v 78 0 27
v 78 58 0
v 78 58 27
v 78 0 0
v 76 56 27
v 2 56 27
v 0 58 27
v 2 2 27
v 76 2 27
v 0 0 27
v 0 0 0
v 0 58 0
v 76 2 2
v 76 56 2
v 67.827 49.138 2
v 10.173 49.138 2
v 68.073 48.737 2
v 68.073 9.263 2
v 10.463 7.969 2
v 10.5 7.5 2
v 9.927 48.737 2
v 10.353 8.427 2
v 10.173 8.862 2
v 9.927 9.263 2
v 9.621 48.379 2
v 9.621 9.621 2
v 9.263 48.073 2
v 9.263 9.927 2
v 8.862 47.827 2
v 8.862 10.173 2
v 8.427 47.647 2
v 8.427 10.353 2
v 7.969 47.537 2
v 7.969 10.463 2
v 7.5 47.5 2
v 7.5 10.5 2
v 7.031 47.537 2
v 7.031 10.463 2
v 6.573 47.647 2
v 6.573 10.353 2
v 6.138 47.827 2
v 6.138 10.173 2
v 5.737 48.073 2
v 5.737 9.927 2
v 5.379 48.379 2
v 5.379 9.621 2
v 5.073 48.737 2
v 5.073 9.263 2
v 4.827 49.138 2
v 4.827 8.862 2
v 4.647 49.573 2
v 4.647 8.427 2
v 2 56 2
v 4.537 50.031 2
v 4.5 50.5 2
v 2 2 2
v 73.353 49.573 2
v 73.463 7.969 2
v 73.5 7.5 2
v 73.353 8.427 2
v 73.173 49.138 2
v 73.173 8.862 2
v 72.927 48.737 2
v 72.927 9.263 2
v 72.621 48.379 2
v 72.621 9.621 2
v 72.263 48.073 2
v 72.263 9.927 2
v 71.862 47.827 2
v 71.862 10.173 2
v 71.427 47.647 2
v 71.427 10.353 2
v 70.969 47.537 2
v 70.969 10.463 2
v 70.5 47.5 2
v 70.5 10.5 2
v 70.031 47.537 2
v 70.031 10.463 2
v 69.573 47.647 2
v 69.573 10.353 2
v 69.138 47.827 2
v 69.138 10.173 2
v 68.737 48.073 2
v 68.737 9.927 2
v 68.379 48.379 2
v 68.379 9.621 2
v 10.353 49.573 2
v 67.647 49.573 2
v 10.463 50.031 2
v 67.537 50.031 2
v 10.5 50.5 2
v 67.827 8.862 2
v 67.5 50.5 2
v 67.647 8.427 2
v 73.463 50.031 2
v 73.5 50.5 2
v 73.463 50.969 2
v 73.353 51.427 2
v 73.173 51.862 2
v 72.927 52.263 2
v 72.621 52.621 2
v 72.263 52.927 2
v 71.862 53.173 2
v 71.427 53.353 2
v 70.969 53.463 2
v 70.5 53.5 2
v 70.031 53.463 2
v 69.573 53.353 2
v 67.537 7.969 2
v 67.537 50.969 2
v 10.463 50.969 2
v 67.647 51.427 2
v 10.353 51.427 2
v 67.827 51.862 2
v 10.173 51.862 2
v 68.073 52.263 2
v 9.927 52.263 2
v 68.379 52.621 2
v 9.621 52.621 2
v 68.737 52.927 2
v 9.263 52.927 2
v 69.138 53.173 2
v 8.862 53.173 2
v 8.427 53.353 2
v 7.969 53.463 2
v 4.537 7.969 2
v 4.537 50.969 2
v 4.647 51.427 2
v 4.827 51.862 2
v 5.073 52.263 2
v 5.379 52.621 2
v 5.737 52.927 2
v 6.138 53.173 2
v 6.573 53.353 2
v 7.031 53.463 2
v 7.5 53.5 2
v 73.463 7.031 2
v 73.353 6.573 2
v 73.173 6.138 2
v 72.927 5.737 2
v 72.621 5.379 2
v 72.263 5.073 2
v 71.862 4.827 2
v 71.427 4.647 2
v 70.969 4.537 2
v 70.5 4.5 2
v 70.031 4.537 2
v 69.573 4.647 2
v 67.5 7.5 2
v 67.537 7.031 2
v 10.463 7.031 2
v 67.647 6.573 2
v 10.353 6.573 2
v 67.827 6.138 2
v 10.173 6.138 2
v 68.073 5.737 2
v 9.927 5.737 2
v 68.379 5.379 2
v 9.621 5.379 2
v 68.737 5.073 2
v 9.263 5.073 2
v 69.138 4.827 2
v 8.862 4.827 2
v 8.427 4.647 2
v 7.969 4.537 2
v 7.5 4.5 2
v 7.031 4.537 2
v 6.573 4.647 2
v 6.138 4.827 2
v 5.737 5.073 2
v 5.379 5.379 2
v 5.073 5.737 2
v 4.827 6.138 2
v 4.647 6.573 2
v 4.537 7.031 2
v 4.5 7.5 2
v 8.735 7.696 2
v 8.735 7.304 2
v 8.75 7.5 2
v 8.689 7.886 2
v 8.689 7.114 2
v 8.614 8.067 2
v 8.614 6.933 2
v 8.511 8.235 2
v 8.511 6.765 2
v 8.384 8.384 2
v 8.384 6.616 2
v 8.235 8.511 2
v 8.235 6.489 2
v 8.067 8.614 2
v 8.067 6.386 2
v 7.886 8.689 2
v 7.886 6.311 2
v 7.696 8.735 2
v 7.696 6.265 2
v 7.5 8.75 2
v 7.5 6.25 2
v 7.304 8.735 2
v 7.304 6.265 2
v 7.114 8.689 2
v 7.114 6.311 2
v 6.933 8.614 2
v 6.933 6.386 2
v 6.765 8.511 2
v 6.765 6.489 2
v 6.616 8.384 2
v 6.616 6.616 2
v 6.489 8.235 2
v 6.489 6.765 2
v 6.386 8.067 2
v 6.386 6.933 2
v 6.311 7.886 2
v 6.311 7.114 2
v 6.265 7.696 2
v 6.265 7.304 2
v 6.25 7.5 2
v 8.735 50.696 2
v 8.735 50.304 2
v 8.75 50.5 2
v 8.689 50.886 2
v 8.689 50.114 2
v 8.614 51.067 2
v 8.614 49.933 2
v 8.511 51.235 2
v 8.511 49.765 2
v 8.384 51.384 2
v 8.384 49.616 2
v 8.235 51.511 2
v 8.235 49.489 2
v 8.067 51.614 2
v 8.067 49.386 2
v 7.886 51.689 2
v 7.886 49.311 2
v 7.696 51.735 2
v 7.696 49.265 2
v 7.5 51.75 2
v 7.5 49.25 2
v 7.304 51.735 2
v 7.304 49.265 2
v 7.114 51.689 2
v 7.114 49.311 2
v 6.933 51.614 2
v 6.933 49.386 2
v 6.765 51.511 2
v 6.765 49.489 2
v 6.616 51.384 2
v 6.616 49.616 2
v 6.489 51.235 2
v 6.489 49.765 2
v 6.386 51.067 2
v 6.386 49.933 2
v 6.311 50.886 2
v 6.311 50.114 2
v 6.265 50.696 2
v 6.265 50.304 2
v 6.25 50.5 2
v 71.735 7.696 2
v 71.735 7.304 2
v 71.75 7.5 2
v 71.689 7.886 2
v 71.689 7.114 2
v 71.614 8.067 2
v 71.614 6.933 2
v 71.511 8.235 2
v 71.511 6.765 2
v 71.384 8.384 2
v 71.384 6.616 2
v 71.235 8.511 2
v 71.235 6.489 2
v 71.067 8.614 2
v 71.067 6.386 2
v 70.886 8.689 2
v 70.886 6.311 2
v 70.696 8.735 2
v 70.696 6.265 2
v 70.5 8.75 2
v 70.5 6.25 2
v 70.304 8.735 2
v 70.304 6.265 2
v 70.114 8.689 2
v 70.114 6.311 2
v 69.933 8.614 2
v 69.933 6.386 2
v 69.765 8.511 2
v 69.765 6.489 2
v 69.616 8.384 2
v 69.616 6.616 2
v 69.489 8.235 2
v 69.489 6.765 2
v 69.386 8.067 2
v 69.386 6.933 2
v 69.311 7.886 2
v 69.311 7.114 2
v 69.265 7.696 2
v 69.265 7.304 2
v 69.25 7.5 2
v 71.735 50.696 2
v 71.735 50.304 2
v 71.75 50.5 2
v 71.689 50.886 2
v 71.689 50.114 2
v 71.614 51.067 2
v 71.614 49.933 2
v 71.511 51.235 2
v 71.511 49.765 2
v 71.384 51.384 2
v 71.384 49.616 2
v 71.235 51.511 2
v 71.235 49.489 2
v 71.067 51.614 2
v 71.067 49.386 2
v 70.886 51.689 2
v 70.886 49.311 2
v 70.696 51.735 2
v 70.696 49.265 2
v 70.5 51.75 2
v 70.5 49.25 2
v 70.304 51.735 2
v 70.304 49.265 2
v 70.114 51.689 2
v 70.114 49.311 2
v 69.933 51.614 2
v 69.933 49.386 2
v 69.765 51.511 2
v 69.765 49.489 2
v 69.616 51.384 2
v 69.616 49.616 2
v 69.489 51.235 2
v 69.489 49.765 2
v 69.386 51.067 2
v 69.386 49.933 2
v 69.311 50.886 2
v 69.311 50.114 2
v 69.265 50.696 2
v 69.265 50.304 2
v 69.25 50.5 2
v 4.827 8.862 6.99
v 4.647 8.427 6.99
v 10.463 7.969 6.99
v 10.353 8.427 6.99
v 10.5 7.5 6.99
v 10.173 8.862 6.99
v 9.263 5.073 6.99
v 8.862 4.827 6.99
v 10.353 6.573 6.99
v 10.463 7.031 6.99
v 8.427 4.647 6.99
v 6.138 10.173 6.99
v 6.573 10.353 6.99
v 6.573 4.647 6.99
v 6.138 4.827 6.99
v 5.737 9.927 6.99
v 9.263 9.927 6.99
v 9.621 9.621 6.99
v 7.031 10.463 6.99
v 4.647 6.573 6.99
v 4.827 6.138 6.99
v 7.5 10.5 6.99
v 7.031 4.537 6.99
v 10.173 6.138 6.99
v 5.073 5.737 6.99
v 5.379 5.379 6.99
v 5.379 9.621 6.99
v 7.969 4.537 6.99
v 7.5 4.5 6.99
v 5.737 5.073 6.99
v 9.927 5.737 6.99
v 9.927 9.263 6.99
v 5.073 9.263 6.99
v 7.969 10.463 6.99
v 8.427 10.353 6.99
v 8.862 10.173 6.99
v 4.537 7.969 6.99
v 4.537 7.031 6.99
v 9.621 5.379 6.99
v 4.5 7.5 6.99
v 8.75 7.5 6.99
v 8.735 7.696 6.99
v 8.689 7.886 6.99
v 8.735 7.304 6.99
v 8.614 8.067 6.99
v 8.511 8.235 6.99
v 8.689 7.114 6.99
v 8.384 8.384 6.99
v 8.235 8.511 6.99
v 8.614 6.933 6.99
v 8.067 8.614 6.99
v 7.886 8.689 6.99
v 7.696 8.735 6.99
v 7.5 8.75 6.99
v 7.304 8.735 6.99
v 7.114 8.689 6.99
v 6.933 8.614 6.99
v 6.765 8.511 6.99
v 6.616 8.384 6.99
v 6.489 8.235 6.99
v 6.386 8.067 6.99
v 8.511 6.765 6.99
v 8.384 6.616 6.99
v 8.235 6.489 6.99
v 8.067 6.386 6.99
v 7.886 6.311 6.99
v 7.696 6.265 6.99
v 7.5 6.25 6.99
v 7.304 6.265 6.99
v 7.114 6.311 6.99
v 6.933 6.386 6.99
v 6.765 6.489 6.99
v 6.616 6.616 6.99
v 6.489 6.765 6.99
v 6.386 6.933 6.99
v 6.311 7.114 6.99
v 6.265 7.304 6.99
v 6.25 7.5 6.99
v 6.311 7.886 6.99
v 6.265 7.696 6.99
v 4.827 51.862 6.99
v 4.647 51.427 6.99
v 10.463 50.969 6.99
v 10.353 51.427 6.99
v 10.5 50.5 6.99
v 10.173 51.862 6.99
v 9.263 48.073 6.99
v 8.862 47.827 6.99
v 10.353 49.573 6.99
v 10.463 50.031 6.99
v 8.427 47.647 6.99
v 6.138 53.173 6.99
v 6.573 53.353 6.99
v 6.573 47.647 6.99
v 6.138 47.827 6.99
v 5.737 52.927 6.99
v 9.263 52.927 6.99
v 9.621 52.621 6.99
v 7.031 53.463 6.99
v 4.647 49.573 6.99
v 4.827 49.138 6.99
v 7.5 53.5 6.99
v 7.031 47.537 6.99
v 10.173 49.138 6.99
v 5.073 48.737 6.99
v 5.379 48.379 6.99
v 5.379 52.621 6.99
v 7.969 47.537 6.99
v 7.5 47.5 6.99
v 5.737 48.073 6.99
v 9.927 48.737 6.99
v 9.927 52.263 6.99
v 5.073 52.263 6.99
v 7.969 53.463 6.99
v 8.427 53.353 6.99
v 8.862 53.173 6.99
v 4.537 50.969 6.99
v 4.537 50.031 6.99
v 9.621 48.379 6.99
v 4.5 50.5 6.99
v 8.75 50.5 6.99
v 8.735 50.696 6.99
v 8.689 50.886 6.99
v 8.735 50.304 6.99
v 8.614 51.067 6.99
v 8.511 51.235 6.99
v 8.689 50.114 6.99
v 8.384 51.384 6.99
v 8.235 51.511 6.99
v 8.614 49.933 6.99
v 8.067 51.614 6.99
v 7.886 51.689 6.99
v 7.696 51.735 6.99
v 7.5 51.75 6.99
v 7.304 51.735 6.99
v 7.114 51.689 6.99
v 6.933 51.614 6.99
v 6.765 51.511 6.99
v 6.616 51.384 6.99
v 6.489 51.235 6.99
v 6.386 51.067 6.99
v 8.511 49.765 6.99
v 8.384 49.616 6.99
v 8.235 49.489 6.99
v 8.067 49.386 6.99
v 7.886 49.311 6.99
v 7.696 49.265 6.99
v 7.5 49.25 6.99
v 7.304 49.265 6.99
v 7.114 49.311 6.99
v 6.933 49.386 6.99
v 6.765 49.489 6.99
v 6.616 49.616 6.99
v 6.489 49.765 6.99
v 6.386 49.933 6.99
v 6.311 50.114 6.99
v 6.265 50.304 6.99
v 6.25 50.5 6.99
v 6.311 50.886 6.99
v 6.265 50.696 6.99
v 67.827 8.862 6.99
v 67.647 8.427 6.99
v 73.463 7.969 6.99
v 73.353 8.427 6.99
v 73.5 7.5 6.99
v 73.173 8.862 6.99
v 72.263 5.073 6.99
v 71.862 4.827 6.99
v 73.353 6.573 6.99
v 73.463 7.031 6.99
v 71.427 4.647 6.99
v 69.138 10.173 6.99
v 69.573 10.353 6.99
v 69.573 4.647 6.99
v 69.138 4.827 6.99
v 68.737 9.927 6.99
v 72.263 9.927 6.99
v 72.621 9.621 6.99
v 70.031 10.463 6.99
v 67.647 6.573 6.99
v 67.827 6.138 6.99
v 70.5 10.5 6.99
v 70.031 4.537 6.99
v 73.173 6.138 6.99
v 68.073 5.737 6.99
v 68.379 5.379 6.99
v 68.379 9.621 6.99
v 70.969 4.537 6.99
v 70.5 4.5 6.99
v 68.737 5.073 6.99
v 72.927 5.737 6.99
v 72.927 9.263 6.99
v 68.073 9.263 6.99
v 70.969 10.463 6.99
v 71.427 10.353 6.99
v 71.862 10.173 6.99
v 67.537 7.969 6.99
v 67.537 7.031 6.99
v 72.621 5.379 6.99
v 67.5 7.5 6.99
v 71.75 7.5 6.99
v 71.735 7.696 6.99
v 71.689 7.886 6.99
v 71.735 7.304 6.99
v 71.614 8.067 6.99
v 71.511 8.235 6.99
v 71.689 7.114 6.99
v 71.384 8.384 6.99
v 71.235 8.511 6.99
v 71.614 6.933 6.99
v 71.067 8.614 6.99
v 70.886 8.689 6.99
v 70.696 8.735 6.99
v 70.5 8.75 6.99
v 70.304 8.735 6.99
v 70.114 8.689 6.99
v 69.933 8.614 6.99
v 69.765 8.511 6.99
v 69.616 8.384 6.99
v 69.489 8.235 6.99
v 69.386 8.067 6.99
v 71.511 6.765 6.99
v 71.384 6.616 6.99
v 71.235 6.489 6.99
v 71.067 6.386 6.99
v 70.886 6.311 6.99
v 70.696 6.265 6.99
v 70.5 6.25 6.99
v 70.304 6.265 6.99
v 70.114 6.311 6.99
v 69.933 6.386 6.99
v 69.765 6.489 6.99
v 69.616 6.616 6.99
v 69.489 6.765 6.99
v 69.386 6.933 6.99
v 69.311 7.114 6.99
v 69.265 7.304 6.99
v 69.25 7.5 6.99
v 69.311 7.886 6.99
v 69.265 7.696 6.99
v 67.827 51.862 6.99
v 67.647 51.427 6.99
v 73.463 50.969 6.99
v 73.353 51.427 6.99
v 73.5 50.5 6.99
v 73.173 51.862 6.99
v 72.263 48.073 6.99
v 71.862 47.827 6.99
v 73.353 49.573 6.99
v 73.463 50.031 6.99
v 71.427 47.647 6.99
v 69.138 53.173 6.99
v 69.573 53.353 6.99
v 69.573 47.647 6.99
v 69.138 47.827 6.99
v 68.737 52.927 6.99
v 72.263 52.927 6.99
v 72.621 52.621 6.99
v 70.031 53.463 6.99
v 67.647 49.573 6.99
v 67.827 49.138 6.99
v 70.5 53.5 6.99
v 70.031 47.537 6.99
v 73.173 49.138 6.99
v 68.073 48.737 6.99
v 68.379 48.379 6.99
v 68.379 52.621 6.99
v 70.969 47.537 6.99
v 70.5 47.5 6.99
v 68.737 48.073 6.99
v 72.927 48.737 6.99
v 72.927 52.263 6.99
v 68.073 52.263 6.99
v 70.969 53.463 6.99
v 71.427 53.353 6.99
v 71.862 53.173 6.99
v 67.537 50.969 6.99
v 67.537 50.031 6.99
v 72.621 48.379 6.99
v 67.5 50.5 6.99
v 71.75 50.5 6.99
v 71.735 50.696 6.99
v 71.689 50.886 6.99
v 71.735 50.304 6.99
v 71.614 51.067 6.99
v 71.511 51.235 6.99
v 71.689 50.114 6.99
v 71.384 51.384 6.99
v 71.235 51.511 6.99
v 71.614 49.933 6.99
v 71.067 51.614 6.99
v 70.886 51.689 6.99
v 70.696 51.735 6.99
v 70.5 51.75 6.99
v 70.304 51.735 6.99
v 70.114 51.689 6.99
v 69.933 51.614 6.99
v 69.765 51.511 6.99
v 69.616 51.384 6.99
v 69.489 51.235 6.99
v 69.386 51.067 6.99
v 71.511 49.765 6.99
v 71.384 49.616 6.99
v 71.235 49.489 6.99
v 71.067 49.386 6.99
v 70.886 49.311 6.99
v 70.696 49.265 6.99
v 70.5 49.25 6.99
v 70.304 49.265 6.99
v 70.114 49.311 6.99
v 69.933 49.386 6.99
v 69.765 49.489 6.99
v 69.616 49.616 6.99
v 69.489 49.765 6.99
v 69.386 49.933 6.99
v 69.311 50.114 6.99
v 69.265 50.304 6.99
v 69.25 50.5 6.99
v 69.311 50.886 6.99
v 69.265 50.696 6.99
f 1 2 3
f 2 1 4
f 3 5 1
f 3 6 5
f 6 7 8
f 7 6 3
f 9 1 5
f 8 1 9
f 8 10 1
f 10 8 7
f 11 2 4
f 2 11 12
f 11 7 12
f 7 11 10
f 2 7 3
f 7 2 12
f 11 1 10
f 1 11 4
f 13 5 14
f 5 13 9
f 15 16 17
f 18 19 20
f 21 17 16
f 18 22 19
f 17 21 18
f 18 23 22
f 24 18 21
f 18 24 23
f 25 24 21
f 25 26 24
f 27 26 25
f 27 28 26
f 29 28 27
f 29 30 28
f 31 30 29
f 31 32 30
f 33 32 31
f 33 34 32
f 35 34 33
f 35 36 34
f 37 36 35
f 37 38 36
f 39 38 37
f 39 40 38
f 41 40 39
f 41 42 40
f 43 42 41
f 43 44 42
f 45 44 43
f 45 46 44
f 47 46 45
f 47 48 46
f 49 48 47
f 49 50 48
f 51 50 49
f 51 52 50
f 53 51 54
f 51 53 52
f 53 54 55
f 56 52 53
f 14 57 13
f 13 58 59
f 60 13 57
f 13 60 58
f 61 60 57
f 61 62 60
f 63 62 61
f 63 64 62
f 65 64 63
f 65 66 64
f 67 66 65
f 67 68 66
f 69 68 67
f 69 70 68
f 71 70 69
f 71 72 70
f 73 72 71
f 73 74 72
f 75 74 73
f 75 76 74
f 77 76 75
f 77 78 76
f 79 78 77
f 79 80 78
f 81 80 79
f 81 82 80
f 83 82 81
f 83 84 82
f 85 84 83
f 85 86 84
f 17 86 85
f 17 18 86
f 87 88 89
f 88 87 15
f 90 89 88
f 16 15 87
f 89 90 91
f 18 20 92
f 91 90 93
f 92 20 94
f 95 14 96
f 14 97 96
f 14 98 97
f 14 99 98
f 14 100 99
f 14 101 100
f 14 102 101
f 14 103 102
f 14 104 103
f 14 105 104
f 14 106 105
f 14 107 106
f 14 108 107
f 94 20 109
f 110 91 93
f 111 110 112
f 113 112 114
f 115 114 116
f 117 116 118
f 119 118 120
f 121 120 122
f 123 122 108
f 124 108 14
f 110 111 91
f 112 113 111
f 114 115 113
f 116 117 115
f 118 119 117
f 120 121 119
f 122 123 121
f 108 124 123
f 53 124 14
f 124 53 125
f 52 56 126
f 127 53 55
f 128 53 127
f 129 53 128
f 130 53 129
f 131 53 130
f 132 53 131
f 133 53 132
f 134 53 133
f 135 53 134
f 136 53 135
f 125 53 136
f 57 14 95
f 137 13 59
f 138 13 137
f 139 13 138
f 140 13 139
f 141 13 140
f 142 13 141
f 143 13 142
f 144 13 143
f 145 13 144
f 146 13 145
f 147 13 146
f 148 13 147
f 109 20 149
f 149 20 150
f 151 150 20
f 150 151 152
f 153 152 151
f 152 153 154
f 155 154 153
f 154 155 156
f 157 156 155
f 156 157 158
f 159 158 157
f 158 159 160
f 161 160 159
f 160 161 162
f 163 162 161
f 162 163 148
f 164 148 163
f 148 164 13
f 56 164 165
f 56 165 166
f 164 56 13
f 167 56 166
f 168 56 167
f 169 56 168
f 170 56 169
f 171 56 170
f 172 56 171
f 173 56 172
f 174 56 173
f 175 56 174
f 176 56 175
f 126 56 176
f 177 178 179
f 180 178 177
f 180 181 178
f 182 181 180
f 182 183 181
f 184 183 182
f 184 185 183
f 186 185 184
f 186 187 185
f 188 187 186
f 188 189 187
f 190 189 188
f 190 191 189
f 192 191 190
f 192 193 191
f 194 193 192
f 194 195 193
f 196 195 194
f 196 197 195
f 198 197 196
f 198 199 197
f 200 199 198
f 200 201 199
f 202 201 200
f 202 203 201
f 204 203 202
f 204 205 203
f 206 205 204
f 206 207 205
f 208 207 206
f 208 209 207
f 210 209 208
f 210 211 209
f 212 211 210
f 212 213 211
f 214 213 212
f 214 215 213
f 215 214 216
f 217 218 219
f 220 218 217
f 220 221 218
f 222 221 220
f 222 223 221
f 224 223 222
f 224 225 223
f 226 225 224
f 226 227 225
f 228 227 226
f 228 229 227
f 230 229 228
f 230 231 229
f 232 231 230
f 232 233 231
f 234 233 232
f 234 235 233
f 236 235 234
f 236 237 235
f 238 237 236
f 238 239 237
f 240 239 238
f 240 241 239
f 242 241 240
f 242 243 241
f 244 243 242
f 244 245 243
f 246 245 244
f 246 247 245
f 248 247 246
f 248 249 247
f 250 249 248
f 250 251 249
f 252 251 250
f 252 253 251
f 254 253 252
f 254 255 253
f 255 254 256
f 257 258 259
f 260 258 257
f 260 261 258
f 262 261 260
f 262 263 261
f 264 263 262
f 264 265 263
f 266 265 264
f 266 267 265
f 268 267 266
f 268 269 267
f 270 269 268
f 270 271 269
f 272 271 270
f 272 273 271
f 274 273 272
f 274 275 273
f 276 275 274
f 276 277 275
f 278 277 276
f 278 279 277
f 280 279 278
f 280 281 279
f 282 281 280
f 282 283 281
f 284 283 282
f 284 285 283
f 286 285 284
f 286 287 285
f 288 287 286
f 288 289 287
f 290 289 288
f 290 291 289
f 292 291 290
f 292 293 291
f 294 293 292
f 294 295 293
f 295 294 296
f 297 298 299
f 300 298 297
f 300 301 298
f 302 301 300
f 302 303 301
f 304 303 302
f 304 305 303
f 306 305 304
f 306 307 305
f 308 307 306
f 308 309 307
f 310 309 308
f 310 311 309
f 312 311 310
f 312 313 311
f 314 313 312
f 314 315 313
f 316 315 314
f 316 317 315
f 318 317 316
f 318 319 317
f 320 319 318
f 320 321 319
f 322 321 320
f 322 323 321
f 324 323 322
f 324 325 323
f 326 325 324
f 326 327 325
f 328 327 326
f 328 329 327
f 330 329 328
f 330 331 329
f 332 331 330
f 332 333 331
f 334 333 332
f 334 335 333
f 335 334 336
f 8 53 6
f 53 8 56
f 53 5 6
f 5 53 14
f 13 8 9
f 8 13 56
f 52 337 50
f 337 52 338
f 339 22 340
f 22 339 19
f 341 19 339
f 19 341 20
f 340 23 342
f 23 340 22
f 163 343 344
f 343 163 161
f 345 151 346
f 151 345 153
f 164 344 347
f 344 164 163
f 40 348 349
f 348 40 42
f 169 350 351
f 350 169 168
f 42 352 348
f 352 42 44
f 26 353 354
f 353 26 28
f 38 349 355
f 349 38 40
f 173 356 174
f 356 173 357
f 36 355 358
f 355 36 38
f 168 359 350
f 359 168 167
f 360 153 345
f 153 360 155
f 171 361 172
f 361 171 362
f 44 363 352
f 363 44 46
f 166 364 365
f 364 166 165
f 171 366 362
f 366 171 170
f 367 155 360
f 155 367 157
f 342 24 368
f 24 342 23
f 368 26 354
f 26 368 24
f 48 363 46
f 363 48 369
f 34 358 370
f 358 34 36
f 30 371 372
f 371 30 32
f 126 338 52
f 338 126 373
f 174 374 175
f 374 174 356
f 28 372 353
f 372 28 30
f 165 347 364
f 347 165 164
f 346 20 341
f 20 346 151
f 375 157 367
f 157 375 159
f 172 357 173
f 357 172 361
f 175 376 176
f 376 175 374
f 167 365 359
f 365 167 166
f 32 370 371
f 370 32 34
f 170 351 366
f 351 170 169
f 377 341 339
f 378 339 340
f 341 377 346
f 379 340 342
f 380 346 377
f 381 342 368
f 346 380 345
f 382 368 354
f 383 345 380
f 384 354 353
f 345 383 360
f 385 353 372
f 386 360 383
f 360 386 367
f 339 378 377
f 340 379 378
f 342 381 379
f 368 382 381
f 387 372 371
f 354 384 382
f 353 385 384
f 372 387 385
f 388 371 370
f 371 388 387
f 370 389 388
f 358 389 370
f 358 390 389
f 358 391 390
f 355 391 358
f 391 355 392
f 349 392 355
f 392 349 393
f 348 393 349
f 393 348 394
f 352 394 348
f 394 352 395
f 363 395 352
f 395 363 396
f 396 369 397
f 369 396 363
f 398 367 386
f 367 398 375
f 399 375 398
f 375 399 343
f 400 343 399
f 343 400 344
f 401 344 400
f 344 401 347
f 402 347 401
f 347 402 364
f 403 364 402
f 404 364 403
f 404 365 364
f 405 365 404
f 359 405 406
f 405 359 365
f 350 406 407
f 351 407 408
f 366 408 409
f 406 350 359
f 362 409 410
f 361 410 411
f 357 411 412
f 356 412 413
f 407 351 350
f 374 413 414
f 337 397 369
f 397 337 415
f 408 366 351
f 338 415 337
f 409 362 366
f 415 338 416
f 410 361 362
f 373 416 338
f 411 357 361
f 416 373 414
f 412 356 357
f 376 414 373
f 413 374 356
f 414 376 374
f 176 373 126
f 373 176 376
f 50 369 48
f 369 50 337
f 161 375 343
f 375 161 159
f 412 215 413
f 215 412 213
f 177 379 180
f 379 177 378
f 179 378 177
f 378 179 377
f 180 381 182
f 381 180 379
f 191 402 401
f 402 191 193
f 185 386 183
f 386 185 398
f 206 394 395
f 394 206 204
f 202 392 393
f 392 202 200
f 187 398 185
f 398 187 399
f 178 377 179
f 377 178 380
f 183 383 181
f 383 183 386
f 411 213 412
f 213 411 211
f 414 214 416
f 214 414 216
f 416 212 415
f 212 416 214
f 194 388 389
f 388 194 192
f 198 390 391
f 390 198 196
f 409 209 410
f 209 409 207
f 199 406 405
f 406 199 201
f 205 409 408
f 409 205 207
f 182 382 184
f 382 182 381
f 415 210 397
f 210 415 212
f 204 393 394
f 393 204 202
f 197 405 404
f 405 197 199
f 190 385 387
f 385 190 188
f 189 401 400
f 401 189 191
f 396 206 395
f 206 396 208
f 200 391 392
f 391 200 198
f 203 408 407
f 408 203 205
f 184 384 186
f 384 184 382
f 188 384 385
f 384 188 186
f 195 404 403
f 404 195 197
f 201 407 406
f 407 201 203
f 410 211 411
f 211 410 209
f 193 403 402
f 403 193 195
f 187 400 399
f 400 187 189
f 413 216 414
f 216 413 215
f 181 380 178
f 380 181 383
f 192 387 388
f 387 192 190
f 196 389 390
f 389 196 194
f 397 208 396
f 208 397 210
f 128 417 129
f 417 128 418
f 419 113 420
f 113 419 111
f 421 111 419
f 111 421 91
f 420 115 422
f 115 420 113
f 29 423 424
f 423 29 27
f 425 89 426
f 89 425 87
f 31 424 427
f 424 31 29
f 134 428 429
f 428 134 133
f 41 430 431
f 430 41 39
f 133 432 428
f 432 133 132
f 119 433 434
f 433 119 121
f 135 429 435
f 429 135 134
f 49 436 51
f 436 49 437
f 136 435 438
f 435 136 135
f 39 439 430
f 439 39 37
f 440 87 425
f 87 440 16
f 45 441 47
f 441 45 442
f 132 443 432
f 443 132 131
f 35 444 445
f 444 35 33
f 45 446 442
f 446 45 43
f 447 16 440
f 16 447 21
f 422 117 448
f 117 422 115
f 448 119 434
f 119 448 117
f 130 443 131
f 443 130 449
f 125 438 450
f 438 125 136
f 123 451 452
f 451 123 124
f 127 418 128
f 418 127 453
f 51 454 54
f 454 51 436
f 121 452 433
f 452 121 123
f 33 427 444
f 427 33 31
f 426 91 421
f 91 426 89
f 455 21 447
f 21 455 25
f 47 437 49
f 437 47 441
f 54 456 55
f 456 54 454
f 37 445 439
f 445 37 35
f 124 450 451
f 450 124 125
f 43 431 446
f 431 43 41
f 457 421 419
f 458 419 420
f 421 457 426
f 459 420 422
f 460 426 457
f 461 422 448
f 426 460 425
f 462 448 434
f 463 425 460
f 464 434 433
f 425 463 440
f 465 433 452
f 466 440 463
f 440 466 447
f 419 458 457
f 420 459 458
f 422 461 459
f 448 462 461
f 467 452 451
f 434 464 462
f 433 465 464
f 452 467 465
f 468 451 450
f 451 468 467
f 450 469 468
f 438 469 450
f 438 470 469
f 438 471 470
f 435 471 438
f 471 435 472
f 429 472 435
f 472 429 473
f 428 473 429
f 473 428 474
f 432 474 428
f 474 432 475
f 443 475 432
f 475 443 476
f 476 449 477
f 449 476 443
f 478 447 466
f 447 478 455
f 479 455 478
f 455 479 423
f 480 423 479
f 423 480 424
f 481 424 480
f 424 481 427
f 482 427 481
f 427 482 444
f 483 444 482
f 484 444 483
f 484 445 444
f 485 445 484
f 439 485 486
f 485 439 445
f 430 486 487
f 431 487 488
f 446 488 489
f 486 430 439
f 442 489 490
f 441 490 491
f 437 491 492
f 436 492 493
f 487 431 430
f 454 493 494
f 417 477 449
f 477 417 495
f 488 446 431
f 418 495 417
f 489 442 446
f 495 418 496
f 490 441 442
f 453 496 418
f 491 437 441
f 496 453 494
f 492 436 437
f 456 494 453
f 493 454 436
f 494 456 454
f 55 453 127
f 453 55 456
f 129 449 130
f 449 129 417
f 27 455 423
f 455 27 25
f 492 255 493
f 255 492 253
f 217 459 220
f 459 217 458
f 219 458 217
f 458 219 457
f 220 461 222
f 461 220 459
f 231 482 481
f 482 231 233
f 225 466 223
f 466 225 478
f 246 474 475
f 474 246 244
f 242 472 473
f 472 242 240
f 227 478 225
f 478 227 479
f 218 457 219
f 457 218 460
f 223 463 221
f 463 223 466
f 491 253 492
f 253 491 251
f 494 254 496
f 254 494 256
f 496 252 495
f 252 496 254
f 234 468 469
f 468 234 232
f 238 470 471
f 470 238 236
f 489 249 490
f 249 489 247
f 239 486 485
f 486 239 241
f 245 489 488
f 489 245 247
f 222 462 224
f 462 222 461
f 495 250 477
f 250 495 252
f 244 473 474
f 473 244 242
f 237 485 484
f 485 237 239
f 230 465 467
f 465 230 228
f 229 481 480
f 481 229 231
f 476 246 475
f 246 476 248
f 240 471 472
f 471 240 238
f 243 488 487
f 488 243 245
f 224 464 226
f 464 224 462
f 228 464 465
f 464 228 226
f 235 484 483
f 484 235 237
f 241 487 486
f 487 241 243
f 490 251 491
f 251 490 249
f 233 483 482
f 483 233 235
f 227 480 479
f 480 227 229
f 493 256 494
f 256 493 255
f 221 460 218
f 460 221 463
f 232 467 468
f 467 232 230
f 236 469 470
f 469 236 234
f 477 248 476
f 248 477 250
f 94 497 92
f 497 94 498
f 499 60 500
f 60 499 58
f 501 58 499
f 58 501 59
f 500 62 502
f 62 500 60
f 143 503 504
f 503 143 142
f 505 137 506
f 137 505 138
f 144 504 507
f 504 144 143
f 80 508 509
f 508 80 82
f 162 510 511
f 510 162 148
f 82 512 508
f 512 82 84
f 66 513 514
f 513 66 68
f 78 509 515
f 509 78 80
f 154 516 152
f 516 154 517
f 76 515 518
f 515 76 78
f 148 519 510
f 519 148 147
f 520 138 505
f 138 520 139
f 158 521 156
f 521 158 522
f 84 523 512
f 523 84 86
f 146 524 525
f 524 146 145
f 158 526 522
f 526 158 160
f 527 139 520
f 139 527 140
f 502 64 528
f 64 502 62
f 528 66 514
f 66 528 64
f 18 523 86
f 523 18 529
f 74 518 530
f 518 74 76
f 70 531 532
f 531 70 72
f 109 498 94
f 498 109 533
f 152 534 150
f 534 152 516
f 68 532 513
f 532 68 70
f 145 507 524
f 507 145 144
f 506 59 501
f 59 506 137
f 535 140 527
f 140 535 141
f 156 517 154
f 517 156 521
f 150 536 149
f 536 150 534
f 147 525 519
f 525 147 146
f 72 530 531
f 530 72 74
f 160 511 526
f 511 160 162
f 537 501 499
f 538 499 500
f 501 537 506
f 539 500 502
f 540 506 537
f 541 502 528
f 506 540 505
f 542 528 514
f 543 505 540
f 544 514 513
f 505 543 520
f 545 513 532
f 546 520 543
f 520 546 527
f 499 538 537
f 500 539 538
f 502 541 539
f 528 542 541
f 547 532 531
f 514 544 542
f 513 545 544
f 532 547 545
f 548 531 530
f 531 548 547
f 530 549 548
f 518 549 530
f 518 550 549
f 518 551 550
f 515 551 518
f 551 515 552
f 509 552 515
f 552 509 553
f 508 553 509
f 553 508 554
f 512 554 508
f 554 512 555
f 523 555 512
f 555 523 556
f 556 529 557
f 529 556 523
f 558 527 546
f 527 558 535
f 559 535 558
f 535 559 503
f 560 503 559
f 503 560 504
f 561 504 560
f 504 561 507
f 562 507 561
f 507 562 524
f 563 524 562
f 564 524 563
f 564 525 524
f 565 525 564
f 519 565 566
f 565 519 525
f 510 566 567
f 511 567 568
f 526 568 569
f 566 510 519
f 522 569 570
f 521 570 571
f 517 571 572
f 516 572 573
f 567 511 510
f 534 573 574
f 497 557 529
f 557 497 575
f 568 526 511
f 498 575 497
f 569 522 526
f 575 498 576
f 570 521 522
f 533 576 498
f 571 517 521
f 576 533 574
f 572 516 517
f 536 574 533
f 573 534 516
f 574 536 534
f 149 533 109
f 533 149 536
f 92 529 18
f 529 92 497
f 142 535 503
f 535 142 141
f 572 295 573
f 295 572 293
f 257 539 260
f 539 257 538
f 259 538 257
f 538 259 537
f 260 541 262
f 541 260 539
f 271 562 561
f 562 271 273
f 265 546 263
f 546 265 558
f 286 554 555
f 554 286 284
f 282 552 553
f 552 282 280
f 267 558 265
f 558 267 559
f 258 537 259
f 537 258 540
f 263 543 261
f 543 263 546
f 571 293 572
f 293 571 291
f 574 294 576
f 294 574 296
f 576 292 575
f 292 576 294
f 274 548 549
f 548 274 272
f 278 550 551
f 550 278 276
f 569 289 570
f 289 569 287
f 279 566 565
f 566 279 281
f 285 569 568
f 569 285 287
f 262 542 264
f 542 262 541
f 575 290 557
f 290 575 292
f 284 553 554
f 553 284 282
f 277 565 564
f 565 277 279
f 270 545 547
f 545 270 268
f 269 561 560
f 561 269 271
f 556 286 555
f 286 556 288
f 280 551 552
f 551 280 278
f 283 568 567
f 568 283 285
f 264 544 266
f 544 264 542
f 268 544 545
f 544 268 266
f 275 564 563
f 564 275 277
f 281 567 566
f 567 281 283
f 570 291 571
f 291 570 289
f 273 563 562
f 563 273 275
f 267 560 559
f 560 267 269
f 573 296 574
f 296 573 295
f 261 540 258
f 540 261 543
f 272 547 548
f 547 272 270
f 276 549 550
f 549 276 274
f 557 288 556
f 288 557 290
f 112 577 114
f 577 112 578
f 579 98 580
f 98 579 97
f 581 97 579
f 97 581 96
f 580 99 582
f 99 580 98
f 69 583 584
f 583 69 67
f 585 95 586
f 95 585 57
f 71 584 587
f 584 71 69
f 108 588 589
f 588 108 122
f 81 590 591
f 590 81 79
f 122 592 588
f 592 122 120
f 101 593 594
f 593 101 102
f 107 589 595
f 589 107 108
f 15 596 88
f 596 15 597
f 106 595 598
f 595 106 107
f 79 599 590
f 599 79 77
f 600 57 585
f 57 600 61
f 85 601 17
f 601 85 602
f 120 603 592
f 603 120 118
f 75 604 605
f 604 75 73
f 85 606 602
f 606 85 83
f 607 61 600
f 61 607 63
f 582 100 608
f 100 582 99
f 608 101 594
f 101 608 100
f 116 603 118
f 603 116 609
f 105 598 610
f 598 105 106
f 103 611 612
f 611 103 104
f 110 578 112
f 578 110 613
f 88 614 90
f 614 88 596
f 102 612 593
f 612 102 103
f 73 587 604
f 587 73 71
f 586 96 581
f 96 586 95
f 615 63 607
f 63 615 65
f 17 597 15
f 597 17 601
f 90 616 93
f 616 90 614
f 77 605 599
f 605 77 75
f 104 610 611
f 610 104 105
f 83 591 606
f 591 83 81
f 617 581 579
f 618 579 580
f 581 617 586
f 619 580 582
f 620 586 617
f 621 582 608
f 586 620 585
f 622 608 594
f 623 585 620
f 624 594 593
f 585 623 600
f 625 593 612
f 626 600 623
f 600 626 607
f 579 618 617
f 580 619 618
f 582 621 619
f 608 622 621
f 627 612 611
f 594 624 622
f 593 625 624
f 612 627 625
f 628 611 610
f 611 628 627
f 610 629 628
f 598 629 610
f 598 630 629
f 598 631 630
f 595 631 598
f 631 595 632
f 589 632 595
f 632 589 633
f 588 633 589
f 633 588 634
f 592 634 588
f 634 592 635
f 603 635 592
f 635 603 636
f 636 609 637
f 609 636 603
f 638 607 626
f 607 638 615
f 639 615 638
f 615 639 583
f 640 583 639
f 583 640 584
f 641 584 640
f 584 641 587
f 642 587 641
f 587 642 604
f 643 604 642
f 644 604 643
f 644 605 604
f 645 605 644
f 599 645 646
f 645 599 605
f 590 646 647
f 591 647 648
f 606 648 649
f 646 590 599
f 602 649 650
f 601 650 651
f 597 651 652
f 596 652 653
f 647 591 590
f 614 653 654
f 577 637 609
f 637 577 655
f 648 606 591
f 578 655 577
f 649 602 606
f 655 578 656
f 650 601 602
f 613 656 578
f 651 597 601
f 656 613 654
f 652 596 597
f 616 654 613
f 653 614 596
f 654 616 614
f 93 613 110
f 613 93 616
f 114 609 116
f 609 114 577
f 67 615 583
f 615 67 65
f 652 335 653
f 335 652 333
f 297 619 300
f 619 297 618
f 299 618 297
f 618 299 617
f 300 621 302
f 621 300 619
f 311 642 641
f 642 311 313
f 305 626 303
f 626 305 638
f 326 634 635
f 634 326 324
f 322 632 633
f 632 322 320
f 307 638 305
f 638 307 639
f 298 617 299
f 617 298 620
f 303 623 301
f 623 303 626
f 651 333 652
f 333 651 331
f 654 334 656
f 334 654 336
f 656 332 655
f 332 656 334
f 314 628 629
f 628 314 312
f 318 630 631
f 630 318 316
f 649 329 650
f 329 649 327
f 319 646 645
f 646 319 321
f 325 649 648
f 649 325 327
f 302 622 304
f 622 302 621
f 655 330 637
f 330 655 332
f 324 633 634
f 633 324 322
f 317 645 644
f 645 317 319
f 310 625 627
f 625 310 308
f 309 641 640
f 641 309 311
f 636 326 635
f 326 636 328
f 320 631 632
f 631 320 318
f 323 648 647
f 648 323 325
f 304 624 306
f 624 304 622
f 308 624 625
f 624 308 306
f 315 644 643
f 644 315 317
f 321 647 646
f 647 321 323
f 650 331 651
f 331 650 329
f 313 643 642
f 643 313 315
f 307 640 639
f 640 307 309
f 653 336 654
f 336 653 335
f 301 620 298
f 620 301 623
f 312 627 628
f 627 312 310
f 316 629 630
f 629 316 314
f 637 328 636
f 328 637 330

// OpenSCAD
// Enclosure
// An open electronics case with four screw standoffs for a PCB.

/* [PCB] */
// PCB width (mm)
pcb_width = 70; // [20:1:200]
// PCB depth (mm)
pcb_depth = 50; // [20:1:200]
// Space between the PCB and the walls (mm)
pcb_gap = 2; // [0.5:0.5:10]
// Height of the standoffs under the PCB (mm)
standoff_height = 5; // [2:0.5:20]

/* [Case] */
// Inside height above the floor (mm)
inner_height = 25; // [10:1:100]
// Wall thickness (mm)
wall = 2; // [1.2:0.2:5]
// Floor thickness (mm)
floor_thickness = 2; // [1:0.2:5]

/* [Screws] */
// Standoff outer diameter (mm)
boss_diameter = 6; // [4:0.5:12]
// Screw pilot hole diameter (mm)
screw_hole = 2.5; // [1.5:0.1:4]

/* [Hidden] */
hole_inset = 3.5;
$fn = 40;
inner_width = pcb_width + 2 * pcb_gap;
inner_depth = pcb_depth + 2 * pcb_gap;

module shell() {
  difference() {
    cube([inner_width + 2 * wall, inner_depth + 2 * wall, floor_thickness + inner_height]);
    translate([wall, wall, floor_thickness])
      cube([inner_width, inner_depth, inner_height + 1]);
  }
}

module standoff() {
  difference() {
    cylinder(h = standoff_height, d = boss_diameter);
    translate([0, 0, -1]) cylinder(h = standoff_height + 2, d = screw_hole);
  }
}

module standoffs() {
  for (x = [hole_inset, pcb_width - hole_inset], y = [hole_inset, pcb_depth - hole_inset])
    translate([wall + pcb_gap + x, wall + pcb_gap + y, floor_thickness - 0.01])
      standoff();
}

shell();
standoffs();
